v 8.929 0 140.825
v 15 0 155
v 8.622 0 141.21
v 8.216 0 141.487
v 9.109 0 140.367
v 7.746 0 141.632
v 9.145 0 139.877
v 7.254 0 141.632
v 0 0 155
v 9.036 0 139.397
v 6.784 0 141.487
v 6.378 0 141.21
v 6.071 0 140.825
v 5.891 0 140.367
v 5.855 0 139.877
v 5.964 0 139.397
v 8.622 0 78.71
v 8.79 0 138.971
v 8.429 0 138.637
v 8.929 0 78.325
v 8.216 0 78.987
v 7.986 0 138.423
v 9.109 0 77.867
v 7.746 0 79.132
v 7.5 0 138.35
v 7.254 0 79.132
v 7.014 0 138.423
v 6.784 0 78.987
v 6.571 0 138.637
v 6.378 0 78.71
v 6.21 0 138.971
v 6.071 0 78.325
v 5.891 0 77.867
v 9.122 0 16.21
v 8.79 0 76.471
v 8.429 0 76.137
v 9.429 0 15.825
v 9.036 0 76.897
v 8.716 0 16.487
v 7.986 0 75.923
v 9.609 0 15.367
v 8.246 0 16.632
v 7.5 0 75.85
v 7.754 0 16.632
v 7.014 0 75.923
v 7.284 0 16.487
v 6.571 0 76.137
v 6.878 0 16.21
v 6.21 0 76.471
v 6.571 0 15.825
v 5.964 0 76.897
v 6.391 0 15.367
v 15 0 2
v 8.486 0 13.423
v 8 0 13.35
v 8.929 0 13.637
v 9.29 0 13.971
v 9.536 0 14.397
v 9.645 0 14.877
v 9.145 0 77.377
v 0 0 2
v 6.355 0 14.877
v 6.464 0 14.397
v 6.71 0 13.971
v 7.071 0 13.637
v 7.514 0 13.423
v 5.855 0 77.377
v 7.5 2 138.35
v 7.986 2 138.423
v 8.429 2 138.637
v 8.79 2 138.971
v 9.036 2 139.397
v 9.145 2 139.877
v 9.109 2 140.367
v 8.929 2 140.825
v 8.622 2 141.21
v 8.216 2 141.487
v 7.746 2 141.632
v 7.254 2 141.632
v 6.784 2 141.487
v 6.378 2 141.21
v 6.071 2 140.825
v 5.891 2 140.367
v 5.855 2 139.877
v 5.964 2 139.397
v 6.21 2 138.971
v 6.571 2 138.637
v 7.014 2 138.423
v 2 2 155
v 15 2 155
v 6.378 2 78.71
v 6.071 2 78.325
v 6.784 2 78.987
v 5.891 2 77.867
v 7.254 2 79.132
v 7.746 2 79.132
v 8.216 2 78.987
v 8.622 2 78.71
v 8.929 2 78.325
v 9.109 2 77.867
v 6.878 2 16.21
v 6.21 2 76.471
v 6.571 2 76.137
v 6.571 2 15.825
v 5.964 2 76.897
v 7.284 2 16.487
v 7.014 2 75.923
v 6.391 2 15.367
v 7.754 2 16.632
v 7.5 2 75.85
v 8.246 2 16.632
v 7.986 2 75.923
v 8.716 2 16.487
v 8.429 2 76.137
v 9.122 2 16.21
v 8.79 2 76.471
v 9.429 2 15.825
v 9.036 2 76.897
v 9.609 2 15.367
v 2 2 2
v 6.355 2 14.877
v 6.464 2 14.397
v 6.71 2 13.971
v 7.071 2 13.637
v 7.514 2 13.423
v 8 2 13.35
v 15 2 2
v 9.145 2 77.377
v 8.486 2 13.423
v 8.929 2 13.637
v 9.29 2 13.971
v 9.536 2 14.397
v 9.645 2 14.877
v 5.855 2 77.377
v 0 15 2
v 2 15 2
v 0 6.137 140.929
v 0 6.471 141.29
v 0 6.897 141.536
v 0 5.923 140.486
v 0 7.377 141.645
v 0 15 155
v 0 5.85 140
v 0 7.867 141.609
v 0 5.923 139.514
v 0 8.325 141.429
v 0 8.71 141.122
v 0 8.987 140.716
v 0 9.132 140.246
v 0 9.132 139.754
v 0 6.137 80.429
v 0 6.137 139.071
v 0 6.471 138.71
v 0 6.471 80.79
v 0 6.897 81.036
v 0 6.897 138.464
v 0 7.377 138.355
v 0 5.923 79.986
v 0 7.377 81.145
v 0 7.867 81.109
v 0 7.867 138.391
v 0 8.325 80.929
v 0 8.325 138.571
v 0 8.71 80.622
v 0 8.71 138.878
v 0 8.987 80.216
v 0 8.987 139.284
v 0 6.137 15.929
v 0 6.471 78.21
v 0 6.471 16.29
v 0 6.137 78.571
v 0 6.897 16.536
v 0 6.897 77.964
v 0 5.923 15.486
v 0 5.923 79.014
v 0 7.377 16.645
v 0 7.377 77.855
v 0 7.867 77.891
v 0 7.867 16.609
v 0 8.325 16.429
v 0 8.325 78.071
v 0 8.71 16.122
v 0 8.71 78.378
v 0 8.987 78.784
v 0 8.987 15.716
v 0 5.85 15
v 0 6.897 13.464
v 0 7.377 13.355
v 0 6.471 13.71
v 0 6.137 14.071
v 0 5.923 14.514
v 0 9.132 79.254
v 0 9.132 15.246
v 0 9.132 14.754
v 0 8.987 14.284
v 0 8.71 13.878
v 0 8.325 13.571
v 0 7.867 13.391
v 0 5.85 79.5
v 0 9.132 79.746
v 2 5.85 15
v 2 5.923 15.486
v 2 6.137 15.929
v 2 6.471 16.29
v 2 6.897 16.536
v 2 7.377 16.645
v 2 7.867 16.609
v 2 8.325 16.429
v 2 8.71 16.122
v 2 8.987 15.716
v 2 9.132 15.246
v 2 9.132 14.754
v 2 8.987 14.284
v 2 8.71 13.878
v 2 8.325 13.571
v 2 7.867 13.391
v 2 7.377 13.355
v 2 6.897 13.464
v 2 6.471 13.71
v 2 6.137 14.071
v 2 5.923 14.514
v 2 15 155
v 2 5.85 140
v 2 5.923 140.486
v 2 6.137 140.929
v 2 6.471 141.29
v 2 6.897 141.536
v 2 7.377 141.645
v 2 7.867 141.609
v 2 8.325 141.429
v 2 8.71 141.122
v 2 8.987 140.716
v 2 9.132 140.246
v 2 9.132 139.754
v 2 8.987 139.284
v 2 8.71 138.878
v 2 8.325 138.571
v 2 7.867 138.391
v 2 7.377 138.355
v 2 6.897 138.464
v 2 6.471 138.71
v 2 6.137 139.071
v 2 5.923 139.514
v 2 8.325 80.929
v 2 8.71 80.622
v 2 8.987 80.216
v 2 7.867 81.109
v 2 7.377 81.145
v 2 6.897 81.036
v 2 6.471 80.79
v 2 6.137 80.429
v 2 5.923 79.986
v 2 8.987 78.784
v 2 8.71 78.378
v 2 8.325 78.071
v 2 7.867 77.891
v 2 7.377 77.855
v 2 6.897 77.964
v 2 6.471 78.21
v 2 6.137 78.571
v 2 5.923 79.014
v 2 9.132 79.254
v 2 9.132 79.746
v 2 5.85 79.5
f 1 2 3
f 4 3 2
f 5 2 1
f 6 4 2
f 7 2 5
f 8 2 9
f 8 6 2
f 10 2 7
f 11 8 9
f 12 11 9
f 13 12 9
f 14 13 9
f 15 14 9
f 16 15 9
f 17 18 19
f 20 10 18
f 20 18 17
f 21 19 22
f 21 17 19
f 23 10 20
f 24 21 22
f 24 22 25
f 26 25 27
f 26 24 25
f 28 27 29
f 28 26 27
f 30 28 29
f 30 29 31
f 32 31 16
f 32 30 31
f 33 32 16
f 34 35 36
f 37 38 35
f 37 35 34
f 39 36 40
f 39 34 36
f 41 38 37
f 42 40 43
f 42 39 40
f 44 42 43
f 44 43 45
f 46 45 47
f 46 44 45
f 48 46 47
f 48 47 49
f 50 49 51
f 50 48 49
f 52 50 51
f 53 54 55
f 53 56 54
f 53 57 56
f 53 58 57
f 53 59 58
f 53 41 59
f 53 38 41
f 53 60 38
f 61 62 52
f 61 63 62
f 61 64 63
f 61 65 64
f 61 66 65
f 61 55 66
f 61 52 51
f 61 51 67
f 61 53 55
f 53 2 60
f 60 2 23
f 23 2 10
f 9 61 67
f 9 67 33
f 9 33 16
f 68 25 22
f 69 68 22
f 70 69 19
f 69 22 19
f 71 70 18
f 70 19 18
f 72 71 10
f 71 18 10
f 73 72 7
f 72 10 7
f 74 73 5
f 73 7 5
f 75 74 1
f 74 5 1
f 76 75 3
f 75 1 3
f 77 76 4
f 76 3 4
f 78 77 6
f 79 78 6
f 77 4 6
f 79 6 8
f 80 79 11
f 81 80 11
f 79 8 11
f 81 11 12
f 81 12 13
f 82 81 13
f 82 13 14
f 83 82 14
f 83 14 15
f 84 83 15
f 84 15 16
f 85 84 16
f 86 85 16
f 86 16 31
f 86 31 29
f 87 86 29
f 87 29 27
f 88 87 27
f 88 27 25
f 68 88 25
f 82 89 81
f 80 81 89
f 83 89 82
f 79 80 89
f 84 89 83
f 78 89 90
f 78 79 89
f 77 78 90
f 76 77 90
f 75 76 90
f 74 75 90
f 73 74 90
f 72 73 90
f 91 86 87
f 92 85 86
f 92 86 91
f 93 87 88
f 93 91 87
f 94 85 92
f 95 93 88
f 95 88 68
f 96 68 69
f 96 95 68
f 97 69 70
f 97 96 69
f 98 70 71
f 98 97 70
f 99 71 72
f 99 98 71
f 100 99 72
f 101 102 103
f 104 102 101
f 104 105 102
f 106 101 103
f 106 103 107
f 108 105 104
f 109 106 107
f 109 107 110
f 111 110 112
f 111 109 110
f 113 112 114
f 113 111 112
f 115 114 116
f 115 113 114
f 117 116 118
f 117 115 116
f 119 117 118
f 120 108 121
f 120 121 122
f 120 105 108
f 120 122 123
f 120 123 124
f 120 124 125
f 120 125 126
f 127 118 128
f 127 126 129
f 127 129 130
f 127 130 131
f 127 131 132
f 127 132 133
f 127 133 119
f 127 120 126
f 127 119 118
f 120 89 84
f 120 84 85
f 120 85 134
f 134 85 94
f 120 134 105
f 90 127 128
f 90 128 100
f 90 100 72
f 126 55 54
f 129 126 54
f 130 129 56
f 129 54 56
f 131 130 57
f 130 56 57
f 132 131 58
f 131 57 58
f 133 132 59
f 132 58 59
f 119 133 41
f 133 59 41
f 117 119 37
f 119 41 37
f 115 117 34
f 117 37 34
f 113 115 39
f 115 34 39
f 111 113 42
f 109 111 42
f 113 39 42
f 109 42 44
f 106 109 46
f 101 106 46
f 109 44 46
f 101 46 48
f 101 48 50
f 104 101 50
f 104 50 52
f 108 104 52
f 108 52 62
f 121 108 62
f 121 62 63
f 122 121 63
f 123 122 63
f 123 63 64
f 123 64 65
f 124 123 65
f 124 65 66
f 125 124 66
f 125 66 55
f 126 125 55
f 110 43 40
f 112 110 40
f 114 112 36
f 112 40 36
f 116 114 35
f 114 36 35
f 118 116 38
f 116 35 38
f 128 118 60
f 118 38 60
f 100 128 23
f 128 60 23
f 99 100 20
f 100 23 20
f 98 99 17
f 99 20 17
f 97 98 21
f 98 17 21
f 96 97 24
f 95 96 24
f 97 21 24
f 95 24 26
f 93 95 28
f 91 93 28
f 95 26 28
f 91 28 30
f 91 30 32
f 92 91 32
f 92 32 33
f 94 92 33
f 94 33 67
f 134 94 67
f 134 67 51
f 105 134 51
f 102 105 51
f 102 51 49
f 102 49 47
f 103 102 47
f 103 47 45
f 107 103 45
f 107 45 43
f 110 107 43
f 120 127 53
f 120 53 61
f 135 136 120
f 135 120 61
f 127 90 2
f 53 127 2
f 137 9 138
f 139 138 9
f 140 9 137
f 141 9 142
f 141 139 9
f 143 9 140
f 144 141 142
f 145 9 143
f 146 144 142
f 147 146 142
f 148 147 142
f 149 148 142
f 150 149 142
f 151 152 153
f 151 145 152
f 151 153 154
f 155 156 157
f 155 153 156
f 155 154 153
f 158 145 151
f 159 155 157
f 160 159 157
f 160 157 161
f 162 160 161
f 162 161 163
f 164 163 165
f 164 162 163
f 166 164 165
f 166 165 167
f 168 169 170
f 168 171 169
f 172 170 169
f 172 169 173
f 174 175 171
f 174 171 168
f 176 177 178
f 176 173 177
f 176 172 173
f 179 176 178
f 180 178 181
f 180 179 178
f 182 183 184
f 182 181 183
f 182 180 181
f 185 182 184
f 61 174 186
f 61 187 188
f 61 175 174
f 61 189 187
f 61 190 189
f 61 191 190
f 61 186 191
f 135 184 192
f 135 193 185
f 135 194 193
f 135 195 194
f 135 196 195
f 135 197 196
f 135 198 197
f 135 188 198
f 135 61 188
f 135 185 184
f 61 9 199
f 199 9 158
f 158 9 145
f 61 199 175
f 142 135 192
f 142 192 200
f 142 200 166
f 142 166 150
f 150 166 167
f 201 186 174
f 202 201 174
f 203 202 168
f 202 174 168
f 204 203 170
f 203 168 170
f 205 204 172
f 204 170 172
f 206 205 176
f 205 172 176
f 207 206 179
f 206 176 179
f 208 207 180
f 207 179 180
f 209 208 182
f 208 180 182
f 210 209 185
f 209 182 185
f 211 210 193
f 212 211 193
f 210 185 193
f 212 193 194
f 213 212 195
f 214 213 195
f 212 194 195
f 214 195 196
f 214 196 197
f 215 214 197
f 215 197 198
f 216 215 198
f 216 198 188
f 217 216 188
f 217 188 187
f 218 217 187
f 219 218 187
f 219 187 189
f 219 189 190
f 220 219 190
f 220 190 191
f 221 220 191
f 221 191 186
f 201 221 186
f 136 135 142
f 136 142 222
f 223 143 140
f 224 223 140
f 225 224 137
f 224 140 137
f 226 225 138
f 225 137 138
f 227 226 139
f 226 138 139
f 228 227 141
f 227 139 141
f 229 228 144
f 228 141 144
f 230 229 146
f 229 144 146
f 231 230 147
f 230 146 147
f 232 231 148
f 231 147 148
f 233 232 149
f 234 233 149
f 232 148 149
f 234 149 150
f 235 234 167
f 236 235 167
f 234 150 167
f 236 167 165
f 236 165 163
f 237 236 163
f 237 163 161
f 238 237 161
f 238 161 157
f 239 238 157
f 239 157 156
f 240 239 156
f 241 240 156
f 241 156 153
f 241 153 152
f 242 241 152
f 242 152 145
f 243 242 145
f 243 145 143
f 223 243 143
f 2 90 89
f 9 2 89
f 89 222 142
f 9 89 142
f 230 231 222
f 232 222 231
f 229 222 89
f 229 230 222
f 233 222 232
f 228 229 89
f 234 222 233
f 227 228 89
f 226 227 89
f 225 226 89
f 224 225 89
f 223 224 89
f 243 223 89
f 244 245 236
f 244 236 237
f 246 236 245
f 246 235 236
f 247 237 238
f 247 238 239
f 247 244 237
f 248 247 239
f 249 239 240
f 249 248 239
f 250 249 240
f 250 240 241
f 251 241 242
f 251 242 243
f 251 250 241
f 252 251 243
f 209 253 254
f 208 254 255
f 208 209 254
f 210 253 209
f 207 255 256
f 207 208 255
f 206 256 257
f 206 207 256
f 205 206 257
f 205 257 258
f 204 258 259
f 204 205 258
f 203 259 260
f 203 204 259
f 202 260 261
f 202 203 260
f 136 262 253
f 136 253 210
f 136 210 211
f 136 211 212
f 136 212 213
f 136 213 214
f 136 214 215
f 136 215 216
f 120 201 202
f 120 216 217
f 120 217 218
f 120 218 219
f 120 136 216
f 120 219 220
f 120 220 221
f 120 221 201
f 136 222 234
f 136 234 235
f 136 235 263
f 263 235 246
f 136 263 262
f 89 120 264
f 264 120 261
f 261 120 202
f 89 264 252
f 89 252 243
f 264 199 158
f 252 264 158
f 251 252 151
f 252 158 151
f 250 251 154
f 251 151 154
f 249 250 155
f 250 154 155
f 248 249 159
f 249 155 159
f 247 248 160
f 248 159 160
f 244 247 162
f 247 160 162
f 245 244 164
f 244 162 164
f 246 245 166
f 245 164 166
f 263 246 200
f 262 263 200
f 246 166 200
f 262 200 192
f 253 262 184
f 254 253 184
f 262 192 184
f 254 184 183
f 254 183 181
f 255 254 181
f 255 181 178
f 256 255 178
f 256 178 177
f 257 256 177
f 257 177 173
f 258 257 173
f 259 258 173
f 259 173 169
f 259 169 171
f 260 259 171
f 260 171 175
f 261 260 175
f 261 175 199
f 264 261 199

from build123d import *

# Parameters (mm, degrees)
EXTRUDE_1_DEPTH          = 155
M4X0_7_1_D               = 3.3
M4X0_7_1_DEPTH           = 11.5
M4X0_7_1_TIP             = 0.991420021
M4X0_7_1_ON_FACE_2_D     = 3.3
M4X0_7_1_ON_FACE_2_DEPTH = 11.5
M4X0_7_1_ON_FACE_2_TIP   = 0.991420021
SKETCH_6_W               = 24.634949406
SKETCH_6_H               = 34.337648086
CUT_EXTRUDE_2_DEPTH      = 2


with BuildPart() as part:
    # ｽｹｯﾁ1 → ﾎﾞｽ - 押し出し1 (new body)
    with BuildSketch(Plane.XY):
        Polygon((0, 0), (0, 15), (2, 15), (2, 2), (15, 2), (15, 0), align=None)
    extrude(amount=EXTRUDE_1_DEPTH)

    # M4x0.7 ねじ穴1
    with Locations(Plane(origin=(2, 7.5, 140), x_dir=(0, 1, 0), z_dir=(1, 0, 0))):
        with Locations((0, 0), (0, -60.5), (0, -125)):
            Hole(M4X0_7_1_D / 2, depth=M4X0_7_1_DEPTH)
            with Locations((0, 0, -(M4X0_7_1_DEPTH + M4X0_7_1_TIP / 2))):  # 118° drill point
                Cone(0, M4X0_7_1_D / 2, M4X0_7_1_TIP, mode=Mode.SUBTRACT)

    # M4x0.7 ねじ穴1 on face 2
    with Locations(Plane(origin=(7.5, 2, 140), x_dir=(0, 0, 1), z_dir=(0, 1, 0))):
        with Locations((0, 0), (-62.5, 0), (-125, 0.5)):
            Hole(M4X0_7_1_ON_FACE_2_D / 2, depth=M4X0_7_1_ON_FACE_2_DEPTH)
            with Locations((0, 0, -(M4X0_7_1_ON_FACE_2_DEPTH + M4X0_7_1_ON_FACE_2_TIP / 2))):  # 118° drill point
                Cone(0, M4X0_7_1_ON_FACE_2_D / 2, M4X0_7_1_ON_FACE_2_TIP, mode=Mode.SUBTRACT)

    # ｽｹｯﾁ6 → ｶｯﾄ - 押し出し2 (cut)
    with BuildSketch(Plane(origin=(0, 0, 0), x_dir=(-1, 0, 0), z_dir=(0, 0, -1))):
        with Locations((-5.917994617, 11.841361704)):
            Rectangle(SKETCH_6_W, SKETCH_6_H)
    extrude(amount=-CUT_EXTRUDE_2_DEPTH, mode=Mode.SUBTRACT)


solid = part.part
